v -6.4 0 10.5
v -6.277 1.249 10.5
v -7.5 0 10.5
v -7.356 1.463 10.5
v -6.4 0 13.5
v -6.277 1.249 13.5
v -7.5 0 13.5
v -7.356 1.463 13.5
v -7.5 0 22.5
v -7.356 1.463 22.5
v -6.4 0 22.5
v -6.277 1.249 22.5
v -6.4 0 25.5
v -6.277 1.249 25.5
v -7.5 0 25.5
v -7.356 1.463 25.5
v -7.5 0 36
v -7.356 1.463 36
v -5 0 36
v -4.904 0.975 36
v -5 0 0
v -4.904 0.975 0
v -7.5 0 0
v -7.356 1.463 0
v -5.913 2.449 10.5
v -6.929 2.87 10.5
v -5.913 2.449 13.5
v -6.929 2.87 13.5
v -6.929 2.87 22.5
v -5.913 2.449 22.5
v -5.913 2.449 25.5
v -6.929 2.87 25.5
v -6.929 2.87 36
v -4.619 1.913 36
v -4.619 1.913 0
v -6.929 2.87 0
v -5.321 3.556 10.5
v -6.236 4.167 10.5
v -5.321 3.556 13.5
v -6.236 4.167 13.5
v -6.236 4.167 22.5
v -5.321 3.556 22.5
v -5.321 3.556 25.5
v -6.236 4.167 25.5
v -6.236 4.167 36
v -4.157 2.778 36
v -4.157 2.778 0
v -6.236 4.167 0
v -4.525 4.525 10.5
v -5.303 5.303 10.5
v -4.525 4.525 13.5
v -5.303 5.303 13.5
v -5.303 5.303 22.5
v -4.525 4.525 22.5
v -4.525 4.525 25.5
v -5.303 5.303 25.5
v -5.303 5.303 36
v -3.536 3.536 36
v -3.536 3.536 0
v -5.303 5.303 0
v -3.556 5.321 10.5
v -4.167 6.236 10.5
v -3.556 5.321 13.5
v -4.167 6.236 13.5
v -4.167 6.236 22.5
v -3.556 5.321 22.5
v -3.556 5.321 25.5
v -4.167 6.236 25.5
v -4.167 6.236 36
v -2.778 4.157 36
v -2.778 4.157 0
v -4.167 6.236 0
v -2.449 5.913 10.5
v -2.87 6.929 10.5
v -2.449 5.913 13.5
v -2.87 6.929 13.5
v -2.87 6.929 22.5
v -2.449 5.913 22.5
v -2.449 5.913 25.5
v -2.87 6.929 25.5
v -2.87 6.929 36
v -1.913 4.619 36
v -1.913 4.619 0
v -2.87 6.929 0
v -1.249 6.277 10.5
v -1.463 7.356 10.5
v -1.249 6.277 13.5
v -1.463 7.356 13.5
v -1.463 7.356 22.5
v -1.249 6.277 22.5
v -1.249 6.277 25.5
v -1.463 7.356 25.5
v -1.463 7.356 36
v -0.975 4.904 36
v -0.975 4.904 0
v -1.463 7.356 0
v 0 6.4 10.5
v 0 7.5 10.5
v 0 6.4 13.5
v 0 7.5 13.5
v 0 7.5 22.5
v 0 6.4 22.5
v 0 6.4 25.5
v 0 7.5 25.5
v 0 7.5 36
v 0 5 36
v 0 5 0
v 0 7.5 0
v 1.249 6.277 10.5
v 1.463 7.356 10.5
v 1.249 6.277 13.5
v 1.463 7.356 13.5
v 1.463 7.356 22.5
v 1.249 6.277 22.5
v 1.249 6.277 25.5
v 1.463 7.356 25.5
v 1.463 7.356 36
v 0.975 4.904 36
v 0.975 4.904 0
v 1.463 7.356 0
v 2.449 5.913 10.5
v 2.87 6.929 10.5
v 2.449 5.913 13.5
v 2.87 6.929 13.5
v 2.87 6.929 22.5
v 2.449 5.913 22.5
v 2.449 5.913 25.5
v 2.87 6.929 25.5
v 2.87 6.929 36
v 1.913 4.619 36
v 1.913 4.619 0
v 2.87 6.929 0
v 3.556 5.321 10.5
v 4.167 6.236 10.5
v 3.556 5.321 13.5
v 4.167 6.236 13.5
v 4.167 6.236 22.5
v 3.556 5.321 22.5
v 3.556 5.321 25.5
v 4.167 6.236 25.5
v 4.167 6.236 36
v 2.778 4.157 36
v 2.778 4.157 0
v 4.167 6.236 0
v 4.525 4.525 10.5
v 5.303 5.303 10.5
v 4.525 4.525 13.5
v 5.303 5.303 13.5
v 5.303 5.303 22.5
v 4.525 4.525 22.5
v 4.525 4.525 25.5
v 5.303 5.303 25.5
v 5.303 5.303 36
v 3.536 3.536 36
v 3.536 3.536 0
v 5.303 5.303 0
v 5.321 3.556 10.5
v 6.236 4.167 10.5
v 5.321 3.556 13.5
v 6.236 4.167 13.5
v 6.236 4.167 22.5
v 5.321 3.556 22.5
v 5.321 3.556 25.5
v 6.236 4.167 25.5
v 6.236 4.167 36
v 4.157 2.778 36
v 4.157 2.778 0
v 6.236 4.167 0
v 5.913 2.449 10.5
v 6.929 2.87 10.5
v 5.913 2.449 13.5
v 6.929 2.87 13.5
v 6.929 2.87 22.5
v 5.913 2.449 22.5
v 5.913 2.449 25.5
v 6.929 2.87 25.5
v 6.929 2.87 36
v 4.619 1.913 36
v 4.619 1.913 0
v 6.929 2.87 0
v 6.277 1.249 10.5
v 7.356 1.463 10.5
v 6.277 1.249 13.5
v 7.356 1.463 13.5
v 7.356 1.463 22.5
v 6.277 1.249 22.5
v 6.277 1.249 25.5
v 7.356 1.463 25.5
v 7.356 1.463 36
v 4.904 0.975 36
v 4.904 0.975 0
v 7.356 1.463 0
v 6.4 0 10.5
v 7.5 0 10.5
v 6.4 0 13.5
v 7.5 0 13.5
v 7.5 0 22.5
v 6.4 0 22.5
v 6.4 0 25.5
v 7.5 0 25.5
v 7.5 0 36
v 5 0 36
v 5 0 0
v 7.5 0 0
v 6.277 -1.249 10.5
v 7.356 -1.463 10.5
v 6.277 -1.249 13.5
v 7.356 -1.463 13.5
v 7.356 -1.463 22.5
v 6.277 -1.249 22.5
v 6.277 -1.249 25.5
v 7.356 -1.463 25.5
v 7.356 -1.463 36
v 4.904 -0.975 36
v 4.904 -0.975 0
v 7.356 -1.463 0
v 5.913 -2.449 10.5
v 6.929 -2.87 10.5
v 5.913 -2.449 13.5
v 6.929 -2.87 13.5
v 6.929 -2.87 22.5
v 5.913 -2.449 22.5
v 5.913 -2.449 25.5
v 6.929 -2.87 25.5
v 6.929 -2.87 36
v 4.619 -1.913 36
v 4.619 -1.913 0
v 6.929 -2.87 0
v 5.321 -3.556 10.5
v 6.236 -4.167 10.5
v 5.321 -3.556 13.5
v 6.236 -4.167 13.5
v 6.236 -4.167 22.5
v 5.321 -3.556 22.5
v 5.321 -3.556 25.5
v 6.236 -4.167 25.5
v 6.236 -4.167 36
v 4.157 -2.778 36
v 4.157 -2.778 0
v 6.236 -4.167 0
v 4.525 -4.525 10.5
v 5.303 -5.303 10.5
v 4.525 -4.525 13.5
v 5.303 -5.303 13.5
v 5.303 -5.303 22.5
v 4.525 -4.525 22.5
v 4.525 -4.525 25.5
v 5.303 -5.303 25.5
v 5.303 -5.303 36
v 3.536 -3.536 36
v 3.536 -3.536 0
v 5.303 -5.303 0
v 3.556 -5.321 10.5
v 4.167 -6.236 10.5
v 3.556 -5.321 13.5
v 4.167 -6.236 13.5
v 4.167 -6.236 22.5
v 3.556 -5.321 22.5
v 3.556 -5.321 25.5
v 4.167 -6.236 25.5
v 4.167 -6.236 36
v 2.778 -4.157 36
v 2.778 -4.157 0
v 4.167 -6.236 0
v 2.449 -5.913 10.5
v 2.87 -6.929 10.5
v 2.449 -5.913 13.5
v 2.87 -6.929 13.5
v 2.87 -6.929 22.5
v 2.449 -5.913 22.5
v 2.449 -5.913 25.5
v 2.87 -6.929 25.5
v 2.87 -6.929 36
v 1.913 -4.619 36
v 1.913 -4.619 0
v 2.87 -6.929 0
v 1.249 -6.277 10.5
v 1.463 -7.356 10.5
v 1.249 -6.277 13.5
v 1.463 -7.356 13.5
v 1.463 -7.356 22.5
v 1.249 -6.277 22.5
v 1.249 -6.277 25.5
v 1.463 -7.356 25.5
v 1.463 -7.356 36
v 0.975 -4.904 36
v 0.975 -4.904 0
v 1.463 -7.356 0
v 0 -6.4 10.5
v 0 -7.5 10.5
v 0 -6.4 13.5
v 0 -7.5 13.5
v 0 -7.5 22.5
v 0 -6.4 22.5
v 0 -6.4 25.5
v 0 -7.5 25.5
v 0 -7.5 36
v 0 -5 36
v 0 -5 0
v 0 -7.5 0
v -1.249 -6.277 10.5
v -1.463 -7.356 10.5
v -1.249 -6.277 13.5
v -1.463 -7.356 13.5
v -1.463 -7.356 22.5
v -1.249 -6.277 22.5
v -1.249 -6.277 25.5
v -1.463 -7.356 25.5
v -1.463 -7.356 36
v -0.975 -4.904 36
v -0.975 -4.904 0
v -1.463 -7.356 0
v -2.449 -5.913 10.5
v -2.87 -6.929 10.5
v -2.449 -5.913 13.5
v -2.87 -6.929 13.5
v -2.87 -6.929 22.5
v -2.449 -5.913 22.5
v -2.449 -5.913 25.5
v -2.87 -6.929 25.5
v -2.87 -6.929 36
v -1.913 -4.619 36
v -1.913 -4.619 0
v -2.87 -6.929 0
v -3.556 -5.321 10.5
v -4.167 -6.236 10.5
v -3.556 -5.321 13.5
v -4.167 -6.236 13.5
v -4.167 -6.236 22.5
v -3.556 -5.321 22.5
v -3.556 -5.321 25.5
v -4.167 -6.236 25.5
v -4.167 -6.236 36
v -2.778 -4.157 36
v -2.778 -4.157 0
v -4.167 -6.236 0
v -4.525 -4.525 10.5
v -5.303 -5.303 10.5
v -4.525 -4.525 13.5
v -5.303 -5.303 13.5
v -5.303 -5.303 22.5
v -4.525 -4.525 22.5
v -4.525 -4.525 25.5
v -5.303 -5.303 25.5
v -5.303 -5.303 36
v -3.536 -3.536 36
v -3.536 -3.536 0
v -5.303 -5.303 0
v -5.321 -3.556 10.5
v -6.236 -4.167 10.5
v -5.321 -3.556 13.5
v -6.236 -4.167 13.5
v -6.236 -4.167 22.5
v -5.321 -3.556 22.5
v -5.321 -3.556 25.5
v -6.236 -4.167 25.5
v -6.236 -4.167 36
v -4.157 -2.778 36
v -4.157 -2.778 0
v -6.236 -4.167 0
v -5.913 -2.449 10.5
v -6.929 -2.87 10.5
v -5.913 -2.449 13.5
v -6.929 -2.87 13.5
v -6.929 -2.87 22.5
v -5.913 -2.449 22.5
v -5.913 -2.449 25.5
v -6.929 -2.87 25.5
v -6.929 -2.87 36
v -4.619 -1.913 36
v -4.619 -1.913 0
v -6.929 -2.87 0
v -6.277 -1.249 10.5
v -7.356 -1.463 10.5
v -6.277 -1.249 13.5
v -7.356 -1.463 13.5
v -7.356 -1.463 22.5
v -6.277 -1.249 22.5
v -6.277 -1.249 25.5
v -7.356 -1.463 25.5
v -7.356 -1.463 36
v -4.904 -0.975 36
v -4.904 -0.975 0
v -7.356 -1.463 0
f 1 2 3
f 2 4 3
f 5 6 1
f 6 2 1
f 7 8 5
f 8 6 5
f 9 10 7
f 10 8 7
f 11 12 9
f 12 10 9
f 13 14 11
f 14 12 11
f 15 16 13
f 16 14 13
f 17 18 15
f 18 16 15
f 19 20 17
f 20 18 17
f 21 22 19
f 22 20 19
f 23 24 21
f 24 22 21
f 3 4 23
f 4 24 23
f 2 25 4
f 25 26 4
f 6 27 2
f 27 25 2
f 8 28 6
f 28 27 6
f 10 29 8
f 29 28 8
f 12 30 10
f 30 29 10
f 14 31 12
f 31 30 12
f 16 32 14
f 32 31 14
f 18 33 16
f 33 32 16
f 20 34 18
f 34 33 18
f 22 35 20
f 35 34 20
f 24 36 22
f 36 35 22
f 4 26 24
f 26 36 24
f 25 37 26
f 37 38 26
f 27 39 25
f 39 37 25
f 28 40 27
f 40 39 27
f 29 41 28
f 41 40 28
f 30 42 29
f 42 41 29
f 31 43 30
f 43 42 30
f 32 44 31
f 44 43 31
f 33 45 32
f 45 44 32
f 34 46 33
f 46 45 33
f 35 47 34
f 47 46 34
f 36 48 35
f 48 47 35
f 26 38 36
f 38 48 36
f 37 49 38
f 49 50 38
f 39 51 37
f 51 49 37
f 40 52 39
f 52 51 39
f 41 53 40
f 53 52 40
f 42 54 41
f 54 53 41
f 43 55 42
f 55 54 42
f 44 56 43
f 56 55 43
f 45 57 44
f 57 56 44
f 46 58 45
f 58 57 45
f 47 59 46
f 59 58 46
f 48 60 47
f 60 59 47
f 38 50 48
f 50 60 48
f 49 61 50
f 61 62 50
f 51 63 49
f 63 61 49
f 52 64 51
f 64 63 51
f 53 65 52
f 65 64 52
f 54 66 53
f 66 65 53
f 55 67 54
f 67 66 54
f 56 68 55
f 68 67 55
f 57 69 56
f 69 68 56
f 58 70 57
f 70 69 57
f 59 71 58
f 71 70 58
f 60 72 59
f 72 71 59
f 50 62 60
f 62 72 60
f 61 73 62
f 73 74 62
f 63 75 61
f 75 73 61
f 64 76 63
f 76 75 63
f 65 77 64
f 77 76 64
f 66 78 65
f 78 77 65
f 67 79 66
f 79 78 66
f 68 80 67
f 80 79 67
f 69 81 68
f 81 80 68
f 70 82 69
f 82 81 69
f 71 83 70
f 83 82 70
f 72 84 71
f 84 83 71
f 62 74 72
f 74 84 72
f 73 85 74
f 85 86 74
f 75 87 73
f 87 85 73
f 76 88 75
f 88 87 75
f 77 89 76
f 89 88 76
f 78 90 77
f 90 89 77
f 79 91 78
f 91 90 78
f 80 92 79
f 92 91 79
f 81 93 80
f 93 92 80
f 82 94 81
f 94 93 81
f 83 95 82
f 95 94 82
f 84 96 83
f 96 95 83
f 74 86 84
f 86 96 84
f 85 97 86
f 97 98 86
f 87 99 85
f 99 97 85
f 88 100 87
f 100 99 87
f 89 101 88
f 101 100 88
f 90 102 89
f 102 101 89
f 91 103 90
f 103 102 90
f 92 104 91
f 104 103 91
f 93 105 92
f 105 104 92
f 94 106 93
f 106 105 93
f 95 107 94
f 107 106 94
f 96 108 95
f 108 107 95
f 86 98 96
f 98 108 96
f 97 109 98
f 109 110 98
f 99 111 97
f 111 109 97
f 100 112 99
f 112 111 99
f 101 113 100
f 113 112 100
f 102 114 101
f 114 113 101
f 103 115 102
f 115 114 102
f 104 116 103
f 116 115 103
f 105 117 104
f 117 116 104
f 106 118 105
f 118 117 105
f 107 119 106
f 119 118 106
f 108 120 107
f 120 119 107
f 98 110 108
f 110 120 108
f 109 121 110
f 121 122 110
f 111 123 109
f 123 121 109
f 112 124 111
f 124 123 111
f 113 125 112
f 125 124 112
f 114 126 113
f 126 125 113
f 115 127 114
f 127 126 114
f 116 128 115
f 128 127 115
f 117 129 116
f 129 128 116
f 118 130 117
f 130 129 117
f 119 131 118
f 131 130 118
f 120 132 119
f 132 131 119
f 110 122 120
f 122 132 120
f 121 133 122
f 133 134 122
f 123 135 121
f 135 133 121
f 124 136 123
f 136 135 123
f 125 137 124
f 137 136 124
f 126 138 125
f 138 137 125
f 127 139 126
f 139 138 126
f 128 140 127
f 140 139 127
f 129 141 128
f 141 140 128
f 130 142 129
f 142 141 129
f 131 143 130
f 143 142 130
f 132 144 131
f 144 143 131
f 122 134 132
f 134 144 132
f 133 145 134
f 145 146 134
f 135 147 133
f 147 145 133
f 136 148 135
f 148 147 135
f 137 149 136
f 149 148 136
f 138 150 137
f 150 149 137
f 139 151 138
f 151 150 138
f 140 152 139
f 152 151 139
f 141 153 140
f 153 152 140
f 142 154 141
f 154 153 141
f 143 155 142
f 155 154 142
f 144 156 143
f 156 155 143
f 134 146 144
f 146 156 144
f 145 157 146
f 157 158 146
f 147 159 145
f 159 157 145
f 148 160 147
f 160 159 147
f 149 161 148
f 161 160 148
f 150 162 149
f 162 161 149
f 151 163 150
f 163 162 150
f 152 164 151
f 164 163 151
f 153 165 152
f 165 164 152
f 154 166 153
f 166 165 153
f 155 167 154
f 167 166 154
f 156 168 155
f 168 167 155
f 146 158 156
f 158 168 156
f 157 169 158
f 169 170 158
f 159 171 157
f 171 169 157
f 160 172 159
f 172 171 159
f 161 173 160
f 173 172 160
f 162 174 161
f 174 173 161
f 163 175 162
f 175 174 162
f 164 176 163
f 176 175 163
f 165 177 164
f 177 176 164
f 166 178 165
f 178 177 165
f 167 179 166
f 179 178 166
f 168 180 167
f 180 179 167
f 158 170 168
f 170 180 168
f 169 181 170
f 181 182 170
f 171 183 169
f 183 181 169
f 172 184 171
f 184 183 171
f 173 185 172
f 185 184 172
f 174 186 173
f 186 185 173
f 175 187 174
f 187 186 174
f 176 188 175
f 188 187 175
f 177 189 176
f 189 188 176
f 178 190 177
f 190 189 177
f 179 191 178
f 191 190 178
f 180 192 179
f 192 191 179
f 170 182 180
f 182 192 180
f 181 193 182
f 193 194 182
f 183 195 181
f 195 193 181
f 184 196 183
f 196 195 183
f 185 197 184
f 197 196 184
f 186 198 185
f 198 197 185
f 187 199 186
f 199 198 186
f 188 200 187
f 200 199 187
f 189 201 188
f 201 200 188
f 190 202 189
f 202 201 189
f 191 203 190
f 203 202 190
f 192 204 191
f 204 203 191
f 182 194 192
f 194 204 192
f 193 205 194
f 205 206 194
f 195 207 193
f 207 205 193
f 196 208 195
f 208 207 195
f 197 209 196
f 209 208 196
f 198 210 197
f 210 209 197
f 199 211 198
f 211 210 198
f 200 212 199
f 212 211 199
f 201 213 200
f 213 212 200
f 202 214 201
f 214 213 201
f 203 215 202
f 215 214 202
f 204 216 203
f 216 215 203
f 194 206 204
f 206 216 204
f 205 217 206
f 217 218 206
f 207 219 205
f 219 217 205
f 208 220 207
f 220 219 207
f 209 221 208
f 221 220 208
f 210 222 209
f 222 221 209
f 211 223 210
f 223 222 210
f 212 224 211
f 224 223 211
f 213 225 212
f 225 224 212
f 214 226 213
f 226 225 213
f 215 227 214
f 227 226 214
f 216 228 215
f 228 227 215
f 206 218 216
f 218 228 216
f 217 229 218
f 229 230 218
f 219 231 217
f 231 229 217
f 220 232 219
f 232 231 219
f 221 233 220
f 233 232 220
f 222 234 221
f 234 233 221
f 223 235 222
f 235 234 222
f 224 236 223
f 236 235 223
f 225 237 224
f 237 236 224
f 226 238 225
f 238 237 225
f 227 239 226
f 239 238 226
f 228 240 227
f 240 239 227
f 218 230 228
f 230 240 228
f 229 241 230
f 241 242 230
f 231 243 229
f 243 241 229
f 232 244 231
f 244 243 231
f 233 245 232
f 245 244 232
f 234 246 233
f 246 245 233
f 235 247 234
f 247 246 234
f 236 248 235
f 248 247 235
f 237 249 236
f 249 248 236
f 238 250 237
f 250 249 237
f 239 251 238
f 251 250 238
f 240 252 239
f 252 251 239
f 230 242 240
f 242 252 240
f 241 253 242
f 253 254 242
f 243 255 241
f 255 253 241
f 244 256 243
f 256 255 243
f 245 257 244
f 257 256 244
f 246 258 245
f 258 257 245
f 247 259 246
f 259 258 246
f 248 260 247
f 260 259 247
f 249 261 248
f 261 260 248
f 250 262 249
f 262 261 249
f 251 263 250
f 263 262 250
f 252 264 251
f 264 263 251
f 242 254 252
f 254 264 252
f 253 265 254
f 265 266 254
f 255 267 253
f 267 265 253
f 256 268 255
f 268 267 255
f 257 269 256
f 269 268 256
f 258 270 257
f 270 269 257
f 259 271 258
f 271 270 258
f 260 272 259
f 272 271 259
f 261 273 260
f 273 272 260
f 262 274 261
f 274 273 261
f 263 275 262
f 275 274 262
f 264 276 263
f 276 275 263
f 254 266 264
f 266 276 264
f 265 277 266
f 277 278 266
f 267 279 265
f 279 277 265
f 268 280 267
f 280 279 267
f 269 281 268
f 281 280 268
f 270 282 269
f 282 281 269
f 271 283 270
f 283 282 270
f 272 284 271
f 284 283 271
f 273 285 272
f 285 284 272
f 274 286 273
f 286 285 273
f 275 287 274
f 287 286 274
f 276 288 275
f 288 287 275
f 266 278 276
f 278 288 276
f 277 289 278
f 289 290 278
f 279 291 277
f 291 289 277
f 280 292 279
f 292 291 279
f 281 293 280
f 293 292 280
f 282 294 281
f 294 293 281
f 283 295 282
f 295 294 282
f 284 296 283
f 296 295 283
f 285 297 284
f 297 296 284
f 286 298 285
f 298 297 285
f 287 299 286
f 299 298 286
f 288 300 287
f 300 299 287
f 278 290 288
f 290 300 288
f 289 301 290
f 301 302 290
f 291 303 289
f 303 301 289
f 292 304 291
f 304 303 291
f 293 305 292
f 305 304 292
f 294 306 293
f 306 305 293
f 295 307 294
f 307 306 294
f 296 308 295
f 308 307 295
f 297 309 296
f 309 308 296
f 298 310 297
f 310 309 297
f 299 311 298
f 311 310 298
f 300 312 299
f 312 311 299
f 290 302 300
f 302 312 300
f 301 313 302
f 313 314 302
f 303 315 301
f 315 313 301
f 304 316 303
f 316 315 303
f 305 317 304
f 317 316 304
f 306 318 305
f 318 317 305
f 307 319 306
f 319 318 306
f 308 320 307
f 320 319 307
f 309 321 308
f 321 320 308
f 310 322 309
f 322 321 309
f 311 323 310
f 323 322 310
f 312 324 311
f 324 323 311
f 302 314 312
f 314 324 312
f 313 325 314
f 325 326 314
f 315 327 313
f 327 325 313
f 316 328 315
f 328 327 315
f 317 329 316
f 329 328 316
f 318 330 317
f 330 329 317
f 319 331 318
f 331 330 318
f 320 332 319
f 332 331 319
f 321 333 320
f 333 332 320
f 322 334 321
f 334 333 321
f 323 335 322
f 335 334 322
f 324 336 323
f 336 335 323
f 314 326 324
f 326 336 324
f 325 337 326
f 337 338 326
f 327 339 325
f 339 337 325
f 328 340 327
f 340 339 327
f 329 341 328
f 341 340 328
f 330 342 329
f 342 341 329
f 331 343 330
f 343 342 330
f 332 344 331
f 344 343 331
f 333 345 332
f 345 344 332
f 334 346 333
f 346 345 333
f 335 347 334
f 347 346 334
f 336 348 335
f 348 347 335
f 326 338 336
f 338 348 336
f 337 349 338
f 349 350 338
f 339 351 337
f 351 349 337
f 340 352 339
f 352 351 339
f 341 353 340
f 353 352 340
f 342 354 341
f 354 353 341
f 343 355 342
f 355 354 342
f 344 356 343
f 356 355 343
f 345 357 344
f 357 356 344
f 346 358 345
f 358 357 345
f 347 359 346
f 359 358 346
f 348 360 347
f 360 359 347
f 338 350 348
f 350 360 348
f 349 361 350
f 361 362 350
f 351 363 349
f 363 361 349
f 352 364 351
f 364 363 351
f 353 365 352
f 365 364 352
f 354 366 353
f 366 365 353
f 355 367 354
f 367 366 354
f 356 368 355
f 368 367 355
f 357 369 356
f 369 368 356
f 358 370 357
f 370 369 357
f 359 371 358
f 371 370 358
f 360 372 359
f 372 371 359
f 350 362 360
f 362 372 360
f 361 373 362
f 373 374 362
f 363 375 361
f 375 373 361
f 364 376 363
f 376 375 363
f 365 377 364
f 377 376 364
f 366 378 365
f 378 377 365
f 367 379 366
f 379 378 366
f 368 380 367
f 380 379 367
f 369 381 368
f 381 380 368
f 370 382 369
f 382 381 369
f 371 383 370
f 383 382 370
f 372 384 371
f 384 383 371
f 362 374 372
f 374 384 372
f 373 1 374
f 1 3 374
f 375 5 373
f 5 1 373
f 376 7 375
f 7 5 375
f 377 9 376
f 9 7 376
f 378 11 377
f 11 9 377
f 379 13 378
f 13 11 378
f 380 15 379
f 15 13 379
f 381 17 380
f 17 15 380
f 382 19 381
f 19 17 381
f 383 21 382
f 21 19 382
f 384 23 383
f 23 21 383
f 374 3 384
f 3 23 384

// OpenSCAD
$fn = 32;

// ----------------------------------------------------------------------
// Grooved revolve: plain_grooves, bore R5
// ----------------------------------------------------------------------

// --- parameters (mm) ---
bore_r = 5;               // bore radius
outer_r = 7.5;            // outer radius of the body
total_h = 36;             // overall height, Z
wall = 2.5;               // radial wall thickness
groove_w = 3;             // groove width
groove_d = 1.1;           // groove depth
grooves = 2;              // number of outer grooves

bbox_x = 2 * outer_r;  // full diameter
bore_d = 2 * bore_r;  // bore diameter
body_d = 2 * outer_r;  // body diameter
revolve_angle = 360;  // full turn around the Z axis

profile = [[5, 0], [7.5, 0], [7.5, 10.5], [6.4, 10.5], [6.4, 13.5], [7.5, 13.5], [7.5, 22.5], [6.4, 22.5], [6.4, 25.5], [7.5, 25.5], [7.5, 36], [5, 36]];  // primary outline, 12 points, counter clockwise

// --- the one profile operation ---
rotate_extrude(angle = revolve_angle) polygon(points = profile);
